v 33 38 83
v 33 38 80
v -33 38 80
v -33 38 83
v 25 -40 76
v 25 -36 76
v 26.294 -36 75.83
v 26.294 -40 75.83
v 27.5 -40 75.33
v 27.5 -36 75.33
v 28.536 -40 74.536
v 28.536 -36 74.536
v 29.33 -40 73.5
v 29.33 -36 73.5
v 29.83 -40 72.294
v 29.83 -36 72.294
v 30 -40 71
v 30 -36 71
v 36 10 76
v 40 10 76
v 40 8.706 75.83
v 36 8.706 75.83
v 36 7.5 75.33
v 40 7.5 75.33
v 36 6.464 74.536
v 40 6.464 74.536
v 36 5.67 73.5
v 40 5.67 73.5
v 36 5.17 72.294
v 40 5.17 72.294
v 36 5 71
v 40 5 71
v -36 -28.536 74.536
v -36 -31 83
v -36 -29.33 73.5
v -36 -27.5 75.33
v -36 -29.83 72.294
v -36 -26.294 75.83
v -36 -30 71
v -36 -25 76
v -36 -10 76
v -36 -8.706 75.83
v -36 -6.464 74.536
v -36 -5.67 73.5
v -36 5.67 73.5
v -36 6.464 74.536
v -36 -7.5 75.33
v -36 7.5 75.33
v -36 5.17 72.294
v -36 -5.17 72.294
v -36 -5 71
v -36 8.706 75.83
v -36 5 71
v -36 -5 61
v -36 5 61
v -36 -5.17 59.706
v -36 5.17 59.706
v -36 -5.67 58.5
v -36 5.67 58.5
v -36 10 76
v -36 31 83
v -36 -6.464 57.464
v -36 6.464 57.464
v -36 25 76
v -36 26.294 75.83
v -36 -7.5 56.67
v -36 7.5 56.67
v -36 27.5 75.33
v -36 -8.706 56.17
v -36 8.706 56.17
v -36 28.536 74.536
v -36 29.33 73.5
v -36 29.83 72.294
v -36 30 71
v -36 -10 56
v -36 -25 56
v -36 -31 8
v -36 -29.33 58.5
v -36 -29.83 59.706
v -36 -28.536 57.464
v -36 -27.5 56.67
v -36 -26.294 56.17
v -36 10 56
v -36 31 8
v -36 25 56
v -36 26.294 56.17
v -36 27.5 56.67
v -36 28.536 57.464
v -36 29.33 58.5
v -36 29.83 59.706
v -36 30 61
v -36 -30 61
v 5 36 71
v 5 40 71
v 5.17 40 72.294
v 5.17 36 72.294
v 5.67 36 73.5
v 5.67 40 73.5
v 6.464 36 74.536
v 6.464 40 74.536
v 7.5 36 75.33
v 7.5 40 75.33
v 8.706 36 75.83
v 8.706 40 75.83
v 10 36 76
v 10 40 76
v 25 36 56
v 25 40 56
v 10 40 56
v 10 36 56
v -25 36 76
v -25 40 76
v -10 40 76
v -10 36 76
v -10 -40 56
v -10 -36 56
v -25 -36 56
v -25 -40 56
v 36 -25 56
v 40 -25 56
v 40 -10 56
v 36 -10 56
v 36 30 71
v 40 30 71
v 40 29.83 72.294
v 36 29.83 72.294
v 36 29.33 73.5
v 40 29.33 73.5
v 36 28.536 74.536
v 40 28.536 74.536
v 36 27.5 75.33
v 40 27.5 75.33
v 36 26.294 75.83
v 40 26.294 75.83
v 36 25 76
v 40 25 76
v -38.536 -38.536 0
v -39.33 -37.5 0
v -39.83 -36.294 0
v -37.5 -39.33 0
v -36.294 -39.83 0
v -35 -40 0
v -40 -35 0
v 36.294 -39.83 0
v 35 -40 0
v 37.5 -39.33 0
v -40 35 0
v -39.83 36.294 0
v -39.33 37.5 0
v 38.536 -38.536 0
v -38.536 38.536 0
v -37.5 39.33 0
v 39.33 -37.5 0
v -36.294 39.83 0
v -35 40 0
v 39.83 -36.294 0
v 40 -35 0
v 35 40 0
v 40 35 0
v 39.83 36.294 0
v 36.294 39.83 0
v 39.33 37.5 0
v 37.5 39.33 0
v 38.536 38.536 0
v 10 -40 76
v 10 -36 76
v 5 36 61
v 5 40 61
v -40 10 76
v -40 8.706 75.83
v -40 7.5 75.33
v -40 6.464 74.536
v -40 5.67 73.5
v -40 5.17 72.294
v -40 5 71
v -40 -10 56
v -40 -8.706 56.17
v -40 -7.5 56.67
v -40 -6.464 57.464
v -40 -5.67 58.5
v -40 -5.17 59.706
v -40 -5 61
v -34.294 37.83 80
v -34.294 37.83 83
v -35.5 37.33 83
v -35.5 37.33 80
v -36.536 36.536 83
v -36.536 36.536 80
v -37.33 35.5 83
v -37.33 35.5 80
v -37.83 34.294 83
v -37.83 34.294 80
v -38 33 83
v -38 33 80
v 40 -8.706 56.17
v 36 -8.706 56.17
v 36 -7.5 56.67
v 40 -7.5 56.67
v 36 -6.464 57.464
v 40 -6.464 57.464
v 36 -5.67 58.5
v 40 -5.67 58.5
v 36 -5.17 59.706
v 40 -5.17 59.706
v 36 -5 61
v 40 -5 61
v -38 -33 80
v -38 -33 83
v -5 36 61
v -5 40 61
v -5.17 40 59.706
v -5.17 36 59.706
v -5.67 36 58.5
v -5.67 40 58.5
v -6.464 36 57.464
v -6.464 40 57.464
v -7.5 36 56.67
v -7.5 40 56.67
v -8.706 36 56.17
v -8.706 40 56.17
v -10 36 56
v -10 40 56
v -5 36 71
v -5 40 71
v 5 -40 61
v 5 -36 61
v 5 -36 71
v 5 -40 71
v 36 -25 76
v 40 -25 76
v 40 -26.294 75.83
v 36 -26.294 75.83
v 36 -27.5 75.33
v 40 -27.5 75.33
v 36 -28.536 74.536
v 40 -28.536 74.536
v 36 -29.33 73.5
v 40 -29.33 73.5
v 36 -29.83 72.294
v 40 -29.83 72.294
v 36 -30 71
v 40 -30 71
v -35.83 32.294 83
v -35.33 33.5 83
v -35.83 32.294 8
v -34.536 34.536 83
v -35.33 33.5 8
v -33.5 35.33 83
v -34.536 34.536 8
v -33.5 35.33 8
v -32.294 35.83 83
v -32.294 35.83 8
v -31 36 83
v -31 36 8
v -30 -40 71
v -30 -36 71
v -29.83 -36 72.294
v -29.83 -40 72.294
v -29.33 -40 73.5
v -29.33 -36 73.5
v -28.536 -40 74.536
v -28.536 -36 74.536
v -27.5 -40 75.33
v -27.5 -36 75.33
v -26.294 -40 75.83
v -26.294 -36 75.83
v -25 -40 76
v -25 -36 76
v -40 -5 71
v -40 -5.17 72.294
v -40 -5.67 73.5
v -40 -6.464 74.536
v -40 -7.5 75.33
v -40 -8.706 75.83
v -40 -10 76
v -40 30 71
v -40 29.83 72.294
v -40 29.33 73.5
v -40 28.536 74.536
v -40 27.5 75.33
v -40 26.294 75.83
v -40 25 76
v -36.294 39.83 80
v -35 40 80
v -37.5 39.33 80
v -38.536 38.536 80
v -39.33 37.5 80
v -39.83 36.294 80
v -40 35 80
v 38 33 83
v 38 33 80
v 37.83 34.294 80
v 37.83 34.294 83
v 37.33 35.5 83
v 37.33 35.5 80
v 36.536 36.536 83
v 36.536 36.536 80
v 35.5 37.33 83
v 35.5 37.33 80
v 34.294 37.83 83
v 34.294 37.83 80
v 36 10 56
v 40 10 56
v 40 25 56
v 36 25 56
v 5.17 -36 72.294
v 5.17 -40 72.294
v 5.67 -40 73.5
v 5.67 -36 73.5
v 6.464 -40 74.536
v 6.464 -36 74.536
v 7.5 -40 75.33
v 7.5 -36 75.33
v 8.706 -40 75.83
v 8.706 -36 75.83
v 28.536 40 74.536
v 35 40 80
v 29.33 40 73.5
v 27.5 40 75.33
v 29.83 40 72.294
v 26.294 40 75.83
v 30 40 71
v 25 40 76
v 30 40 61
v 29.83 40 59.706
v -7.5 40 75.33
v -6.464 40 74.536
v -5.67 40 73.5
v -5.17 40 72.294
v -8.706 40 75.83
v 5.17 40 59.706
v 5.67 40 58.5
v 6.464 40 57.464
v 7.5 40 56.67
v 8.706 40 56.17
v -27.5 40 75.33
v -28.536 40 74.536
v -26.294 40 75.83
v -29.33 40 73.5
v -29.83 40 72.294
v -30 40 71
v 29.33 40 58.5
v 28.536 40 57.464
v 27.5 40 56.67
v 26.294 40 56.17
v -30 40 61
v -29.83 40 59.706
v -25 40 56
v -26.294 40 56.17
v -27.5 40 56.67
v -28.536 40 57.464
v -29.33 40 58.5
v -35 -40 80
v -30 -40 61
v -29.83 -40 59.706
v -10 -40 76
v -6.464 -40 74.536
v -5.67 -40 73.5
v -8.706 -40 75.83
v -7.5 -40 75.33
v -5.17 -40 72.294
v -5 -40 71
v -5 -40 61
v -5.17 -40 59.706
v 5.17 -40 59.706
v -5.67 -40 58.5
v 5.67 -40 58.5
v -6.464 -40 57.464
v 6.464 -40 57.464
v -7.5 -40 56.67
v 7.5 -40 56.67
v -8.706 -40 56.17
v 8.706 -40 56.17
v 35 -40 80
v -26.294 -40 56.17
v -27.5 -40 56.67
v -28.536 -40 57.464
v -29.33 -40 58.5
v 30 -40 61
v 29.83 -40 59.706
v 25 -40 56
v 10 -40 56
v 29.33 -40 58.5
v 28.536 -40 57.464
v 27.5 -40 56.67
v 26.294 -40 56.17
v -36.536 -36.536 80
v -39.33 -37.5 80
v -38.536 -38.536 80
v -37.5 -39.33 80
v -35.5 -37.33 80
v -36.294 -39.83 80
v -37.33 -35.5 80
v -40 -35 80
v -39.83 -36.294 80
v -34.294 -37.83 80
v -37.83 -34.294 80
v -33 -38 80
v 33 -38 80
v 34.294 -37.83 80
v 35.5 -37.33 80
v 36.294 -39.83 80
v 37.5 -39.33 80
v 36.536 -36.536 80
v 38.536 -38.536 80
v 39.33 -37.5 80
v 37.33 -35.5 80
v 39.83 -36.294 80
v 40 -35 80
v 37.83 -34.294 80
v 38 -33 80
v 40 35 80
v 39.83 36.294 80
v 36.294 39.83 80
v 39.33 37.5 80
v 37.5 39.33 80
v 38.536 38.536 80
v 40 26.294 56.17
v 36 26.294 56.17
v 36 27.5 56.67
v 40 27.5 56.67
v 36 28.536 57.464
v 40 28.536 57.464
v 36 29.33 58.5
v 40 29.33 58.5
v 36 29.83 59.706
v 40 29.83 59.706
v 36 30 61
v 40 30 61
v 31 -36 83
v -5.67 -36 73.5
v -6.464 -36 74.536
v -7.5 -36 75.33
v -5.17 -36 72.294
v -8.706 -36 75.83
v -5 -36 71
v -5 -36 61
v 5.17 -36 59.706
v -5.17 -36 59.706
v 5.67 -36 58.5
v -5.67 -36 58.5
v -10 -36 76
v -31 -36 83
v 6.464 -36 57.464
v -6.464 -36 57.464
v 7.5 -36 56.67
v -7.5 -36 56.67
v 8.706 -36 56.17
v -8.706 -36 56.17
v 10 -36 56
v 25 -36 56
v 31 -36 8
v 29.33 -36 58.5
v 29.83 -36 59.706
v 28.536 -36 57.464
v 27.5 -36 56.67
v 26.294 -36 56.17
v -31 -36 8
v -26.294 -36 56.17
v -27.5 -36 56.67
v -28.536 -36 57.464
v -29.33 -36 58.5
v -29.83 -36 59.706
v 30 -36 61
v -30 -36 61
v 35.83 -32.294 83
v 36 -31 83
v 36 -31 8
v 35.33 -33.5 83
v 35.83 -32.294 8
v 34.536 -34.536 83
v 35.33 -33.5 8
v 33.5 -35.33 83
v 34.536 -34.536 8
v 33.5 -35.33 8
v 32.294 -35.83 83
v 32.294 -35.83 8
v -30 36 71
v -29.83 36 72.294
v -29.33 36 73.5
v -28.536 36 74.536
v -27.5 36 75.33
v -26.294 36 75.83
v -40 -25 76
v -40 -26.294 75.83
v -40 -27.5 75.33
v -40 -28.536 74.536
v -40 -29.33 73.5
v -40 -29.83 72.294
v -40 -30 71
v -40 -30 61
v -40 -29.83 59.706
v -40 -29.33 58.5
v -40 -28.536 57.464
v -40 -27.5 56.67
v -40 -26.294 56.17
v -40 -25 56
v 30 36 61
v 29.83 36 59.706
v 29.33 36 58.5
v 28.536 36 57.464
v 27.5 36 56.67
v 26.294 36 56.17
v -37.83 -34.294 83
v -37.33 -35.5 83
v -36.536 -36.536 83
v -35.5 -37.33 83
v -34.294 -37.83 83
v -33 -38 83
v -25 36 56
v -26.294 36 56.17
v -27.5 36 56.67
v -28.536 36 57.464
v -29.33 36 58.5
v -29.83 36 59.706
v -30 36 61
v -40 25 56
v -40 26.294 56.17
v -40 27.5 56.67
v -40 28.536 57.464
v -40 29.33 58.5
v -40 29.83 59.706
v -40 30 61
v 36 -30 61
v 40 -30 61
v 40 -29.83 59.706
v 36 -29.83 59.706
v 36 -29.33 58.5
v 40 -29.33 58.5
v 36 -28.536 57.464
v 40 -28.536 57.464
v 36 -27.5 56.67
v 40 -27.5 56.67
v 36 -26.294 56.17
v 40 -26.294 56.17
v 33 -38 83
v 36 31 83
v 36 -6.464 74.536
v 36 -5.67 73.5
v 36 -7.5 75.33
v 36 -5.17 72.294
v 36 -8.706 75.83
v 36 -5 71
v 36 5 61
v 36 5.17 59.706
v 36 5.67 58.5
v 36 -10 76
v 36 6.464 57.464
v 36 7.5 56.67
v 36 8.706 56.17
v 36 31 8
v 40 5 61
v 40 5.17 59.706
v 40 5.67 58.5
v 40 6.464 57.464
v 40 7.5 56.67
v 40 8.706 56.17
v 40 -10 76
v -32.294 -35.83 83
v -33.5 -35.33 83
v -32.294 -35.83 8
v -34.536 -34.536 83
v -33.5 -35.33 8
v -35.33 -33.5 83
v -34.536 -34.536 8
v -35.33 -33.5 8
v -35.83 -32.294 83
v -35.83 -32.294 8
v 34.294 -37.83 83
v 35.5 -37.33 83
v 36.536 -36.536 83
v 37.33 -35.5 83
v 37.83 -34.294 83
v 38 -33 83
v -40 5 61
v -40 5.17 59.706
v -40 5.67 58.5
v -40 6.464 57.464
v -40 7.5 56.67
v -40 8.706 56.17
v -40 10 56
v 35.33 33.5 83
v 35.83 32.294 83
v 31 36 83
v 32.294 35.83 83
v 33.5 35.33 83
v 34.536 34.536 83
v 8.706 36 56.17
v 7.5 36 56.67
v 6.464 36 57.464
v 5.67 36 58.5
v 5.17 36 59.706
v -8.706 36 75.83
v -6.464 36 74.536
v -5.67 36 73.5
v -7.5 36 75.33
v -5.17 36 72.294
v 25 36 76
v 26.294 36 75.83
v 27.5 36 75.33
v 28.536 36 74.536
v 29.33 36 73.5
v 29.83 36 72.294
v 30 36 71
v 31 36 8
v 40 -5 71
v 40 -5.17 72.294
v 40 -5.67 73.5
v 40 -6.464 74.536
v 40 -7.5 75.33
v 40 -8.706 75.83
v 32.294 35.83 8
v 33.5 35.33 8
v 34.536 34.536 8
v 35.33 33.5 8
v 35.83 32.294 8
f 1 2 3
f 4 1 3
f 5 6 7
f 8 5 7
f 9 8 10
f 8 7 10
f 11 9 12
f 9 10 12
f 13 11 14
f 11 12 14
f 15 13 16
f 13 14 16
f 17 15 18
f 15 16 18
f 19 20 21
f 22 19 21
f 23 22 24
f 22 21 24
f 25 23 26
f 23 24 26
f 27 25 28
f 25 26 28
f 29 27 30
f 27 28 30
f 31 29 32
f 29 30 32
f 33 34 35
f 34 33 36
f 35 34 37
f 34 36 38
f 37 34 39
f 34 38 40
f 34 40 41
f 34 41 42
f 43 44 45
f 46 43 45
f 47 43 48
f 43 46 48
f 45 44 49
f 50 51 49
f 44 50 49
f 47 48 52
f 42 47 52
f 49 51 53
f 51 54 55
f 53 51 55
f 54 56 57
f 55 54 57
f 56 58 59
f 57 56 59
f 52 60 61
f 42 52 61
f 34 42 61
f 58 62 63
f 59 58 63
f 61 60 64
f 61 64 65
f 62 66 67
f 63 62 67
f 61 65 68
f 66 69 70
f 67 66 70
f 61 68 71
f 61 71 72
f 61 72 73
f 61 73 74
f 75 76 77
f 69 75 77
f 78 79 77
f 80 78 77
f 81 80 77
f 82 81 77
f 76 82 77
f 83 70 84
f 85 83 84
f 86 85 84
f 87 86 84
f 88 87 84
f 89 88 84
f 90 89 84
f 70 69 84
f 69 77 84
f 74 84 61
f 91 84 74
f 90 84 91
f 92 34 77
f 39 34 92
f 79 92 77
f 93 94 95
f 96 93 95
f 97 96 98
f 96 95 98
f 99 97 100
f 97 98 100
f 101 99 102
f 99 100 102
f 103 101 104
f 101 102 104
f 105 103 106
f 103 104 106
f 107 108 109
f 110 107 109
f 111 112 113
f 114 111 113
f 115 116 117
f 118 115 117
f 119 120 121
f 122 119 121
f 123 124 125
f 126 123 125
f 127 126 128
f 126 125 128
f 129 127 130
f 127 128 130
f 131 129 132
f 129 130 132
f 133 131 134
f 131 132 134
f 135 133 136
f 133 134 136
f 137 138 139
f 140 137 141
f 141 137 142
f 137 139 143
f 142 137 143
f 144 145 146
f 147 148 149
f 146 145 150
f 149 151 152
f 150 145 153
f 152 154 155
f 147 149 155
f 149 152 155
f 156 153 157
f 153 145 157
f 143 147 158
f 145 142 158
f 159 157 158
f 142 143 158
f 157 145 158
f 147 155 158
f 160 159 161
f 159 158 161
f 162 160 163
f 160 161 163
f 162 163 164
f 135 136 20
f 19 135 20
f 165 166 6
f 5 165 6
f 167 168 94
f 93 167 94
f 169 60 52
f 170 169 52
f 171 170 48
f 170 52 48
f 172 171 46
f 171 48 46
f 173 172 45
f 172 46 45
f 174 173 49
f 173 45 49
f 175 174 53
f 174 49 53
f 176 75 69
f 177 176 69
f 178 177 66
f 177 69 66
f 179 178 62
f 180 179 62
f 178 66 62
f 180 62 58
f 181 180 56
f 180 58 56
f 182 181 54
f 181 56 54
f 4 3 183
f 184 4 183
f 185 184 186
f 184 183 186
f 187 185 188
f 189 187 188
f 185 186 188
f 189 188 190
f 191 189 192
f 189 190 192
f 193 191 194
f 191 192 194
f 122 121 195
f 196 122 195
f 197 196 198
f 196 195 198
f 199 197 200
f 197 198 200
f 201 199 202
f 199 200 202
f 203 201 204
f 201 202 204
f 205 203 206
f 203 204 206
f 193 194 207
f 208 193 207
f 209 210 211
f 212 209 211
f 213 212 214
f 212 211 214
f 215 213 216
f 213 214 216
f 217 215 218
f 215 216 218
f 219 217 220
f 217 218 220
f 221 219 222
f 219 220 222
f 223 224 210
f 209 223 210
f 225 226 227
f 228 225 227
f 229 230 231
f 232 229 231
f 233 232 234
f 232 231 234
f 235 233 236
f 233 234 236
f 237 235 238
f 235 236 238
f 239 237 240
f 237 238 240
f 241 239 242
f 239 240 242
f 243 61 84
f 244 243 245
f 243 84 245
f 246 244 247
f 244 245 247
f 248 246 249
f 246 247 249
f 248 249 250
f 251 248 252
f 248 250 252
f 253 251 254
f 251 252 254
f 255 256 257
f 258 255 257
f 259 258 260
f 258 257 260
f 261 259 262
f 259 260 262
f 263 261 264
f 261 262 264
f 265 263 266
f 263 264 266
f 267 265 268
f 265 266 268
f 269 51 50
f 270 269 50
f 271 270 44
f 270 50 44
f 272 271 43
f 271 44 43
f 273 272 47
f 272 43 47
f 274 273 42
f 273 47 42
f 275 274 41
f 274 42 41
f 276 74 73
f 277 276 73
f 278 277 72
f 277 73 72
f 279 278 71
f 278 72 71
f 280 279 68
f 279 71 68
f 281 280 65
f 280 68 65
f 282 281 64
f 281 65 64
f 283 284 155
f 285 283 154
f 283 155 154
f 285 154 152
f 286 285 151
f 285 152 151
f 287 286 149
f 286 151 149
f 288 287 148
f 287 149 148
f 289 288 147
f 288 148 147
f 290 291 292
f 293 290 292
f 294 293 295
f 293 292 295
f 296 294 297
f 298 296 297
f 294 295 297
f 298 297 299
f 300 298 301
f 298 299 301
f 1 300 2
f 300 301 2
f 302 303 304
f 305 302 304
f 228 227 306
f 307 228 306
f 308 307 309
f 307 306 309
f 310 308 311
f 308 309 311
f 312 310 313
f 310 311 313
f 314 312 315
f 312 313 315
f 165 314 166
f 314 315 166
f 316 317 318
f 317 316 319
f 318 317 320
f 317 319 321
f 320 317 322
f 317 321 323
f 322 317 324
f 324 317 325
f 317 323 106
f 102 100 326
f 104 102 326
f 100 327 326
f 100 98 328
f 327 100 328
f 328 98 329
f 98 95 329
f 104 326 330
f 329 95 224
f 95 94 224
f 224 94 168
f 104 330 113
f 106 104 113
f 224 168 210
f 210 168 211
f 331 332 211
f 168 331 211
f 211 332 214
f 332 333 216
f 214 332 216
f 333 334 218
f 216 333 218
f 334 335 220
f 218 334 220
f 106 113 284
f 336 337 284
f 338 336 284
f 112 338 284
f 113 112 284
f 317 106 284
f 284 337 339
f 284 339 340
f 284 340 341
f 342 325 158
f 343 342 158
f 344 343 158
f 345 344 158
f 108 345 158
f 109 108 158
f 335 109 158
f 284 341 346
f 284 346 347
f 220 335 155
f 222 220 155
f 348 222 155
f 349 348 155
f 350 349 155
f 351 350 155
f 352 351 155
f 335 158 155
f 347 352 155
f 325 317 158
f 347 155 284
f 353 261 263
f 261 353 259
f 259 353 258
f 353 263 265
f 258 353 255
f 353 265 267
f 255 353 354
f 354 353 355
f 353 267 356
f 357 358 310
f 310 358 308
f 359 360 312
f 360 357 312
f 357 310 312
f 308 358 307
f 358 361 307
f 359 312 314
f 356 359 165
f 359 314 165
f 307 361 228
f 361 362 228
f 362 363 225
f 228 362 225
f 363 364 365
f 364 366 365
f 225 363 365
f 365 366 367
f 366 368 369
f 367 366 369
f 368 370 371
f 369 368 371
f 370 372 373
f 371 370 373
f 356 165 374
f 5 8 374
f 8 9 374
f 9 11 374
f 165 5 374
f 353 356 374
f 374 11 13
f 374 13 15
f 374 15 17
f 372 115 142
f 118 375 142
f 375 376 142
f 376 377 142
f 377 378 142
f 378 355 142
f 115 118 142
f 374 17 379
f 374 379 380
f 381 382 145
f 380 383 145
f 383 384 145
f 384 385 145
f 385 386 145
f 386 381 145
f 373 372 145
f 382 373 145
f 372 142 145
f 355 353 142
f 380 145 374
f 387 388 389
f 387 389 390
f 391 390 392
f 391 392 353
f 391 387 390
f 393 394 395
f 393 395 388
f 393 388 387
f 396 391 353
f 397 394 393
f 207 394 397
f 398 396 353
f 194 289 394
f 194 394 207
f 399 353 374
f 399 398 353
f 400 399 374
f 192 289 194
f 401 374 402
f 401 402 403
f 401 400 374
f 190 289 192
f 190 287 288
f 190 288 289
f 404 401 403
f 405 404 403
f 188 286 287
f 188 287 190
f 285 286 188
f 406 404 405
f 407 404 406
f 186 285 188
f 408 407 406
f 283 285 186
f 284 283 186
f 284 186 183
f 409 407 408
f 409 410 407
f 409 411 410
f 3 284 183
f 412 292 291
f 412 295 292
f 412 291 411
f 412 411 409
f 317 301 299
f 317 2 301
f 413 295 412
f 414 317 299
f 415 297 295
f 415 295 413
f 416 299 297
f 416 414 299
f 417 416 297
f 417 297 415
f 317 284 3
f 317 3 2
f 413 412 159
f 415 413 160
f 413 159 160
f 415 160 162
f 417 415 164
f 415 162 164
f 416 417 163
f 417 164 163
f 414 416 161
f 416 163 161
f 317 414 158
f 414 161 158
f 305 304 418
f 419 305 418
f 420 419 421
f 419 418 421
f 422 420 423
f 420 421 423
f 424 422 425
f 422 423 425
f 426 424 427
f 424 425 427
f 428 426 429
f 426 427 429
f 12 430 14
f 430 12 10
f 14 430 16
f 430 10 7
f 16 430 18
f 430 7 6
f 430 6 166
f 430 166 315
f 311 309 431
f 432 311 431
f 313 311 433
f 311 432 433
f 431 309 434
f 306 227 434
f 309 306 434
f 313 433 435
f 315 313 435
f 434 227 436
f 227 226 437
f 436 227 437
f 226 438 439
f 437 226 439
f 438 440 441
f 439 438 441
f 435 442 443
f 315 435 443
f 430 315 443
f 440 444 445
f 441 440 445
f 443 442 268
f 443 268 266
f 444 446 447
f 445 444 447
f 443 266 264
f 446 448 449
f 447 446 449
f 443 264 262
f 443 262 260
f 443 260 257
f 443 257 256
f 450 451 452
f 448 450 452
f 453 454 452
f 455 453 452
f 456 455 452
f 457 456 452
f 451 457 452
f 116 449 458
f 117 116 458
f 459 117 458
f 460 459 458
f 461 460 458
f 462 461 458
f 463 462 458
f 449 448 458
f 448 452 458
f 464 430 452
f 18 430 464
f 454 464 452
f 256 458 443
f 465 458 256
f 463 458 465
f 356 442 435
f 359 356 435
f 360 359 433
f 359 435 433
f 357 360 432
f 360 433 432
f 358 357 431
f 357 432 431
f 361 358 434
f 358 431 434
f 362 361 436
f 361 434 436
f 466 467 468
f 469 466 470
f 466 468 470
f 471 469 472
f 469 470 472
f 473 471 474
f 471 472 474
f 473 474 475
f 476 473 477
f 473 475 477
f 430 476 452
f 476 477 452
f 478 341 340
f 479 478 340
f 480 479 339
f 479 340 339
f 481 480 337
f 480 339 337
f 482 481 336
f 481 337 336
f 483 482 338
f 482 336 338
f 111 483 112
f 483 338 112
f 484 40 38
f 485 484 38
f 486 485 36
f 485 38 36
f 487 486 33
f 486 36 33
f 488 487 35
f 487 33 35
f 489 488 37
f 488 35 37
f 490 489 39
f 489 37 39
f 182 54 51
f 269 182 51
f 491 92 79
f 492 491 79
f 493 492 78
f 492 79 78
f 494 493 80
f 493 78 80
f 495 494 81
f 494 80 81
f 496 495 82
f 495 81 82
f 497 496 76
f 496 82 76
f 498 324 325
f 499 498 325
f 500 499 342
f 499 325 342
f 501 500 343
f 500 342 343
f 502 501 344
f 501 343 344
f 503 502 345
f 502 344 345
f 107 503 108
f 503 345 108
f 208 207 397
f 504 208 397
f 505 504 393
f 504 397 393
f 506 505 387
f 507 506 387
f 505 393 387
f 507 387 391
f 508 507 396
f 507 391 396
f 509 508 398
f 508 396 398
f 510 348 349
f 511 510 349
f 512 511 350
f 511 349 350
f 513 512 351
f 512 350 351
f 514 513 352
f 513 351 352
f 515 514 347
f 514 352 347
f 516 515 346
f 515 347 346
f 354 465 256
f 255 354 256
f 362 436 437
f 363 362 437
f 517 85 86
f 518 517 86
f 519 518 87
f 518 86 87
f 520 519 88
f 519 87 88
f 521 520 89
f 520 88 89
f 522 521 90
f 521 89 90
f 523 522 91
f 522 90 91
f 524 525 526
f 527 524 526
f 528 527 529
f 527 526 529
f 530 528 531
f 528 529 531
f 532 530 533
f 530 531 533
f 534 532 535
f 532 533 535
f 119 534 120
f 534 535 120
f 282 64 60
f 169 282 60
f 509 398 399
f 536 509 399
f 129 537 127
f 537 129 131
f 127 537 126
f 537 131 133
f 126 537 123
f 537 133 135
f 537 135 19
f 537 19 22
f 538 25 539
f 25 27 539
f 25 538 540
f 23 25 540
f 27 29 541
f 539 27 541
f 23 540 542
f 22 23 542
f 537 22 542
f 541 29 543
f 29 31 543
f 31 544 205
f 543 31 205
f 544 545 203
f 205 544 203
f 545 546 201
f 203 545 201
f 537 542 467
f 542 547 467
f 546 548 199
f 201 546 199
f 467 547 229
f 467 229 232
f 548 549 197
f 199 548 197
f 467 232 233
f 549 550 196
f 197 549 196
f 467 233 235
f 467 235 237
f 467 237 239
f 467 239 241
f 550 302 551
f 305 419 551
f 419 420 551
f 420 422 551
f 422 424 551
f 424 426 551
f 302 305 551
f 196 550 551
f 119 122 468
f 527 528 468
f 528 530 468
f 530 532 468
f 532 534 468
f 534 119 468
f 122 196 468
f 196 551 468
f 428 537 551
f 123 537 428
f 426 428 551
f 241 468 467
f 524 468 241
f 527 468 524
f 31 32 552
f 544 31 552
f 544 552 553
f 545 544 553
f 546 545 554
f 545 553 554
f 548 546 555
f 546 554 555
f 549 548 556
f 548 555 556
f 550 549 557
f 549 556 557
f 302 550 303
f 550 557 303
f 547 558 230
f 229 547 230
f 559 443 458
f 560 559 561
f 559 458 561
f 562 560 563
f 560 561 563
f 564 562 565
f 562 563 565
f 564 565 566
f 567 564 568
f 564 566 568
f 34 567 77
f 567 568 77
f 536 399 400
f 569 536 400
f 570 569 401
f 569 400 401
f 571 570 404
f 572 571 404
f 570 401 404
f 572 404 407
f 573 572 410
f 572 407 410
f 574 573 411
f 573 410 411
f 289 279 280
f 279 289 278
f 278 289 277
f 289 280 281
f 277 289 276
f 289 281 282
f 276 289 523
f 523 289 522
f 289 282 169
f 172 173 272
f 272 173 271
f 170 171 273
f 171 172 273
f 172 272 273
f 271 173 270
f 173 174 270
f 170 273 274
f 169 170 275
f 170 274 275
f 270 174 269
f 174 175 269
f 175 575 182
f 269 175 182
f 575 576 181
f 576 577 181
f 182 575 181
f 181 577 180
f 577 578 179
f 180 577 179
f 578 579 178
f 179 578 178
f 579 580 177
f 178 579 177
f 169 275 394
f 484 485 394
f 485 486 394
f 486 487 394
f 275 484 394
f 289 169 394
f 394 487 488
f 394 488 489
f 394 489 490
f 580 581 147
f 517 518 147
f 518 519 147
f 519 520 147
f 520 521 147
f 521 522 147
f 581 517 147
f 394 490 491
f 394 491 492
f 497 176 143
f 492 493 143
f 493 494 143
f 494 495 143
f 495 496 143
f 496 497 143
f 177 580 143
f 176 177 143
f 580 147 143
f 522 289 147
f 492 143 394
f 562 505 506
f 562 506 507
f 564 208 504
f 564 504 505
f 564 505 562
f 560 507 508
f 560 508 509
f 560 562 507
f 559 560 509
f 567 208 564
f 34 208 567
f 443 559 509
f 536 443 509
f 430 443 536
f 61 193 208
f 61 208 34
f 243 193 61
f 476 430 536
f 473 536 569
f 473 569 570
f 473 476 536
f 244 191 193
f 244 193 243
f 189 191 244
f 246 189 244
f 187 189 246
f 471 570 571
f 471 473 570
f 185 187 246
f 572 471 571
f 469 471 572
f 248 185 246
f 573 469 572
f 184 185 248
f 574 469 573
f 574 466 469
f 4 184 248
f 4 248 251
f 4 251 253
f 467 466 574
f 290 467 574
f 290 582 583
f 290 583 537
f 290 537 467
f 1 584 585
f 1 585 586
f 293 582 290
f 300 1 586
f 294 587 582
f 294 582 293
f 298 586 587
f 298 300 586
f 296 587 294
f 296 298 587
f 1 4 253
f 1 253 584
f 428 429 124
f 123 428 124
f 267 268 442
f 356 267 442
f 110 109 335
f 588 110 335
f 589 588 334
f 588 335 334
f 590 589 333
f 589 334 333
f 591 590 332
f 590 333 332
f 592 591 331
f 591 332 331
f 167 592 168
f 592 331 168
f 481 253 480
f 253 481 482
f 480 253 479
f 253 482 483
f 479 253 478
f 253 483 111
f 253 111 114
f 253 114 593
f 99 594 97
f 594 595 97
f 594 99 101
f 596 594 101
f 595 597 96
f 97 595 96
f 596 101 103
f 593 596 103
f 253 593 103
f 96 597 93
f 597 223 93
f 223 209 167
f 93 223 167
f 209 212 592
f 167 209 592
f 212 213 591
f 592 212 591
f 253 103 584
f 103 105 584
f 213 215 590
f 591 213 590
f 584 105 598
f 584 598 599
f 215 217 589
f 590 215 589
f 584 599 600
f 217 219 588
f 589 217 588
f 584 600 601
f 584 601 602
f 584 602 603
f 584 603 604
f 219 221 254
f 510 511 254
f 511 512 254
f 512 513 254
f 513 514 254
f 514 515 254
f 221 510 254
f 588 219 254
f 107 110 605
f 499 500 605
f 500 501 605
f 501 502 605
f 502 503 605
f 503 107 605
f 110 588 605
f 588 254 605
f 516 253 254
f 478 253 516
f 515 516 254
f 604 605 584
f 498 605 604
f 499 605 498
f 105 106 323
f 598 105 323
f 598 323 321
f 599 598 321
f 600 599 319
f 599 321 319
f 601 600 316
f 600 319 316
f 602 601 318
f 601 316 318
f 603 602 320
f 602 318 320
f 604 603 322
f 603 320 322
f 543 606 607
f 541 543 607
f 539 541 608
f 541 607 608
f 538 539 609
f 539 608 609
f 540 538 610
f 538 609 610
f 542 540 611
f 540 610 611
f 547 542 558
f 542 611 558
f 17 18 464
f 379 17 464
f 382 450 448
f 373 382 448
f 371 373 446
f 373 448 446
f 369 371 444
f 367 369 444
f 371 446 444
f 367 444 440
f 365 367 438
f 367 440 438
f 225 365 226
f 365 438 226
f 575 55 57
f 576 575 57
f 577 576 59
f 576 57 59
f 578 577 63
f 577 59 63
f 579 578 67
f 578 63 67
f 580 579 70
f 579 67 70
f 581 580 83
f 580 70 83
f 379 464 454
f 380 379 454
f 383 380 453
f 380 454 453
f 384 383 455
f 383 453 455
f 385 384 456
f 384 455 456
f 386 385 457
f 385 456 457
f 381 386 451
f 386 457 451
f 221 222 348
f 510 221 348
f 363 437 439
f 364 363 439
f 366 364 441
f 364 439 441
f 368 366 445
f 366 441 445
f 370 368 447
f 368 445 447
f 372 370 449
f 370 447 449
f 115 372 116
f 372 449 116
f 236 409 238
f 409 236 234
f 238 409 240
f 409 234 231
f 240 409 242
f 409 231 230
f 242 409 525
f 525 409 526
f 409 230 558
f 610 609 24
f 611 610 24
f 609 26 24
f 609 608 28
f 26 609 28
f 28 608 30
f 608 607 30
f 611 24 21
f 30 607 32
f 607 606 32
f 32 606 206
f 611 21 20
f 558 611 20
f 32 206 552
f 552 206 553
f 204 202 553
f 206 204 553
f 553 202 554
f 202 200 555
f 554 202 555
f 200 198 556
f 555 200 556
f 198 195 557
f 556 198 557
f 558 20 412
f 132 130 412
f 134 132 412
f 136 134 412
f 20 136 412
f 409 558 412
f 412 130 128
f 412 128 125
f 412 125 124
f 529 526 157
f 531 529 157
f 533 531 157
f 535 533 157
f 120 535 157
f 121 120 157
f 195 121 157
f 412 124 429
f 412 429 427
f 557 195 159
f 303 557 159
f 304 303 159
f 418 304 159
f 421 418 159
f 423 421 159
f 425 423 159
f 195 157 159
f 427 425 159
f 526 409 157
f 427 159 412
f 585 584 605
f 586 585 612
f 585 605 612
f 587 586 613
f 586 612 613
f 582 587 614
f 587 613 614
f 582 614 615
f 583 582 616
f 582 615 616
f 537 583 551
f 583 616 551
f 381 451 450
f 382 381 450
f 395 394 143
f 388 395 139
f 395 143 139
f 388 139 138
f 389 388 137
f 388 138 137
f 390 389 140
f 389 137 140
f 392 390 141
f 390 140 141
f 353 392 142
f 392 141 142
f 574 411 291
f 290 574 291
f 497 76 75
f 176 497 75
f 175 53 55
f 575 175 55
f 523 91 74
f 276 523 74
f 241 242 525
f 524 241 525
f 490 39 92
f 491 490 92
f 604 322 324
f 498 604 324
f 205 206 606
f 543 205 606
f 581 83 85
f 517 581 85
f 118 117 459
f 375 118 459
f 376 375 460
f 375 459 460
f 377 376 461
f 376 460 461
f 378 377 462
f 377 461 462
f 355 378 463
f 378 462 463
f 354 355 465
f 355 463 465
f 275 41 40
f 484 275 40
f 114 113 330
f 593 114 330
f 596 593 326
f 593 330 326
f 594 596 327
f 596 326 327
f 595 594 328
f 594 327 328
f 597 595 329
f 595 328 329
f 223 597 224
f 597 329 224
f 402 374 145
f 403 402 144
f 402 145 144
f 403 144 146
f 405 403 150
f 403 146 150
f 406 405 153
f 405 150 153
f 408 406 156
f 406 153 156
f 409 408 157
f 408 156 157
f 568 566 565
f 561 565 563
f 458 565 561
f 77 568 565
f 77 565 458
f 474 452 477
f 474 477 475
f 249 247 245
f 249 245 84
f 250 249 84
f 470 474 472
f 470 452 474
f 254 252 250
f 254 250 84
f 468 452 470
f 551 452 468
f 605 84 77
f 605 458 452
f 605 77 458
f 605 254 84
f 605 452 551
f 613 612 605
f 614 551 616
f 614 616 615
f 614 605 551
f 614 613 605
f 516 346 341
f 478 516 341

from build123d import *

# Parameters (mm, degrees)
F1_DEPTH = 80
F2_DEPTH = 8
F4_DEPTH = 3
F7_DEPTH = 80.001
F8_DEPTH = 80.001


with BuildPart() as f1:
    # F0 (on Top) → F1 (new body)
    with BuildSketch(Plane.XY):
        with BuildLine():
            Line((35, 40), (-35, 40))
            ThreePointArc((-35, 40), (-38.535534, 38.535534), (-40, 35))
            Line((-40, 35), (-40, -35))
            ThreePointArc((-40, -35), (-38.535534, -38.535534), (-35, -40))
            Line((-35, -40), (35, -40))
            ThreePointArc((35, -40), (38.535534, -38.535534), (40, -35))
            Line((40, -35), (40, 35))
            ThreePointArc((40, 35), (38.535534, 38.535534), (35, 40))
        make_face()
        with BuildLine():
            ThreePointArc((-36, 31), (-34.535534, 34.535534), (-31, 36))
            Line((-31, 36), (31, 36))
            ThreePointArc((31, 36), (34.535534, 34.535534), (36, 31))
            Line((36, 31), (36, -31))
            ThreePointArc((36, -31), (34.535534, -34.535534), (31, -36))
            Line((31, -36), (-31, -36))
            ThreePointArc((-31, -36), (-34.535534, -34.535534), (-36, -31))
            Line((-36, -31), (-36, 31))
        make_face(mode=Mode.SUBTRACT)
    extrude(amount=F1_DEPTH)

    # F0 (on Top) → F2 (join)
    with BuildSketch(Plane.XY):
        with BuildLine():
            Line((31, 36), (-31, 36))
            ThreePointArc((-31, 36), (-34.535534, 34.535534), (-36, 31))
            Line((-36, 31), (-36, -31))
            ThreePointArc((-36, -31), (-34.535534, -34.535534), (-31, -36))
            Line((-31, -36), (31, -36))
            ThreePointArc((31, -36), (34.535534, -34.535534), (36, -31))
            Line((36, -31), (36, 31))
            ThreePointArc((36, 31), (34.535534, 34.535534), (31, 36))
        make_face()
    extrude(amount=F2_DEPTH)

    # F3 (on face) → F4 (join)
    with BuildSketch(Plane.XY.offset(80)):
        with BuildLine():
            Line((33, 38), (-33, 38))
            ThreePointArc((-33, 38), (-36.535534, 36.535534), (-38, 33))
            Line((-38, 33), (-38, -33))
            ThreePointArc((-38, -33), (-36.535534, -36.535534), (-33, -38))
            Line((-33, -38), (33, -38))
            ThreePointArc((33, -38), (36.535534, -36.535534), (38, -33))
            Line((38, -33), (38, 33))
            ThreePointArc((38, 33), (36.535534, 36.535534), (33, 38))
        make_face()
        with BuildLine():
            Line((-36, -31), (-36, 31))
            ThreePointArc((-36, 31), (-34.535534, 34.535534), (-31, 36))
            Line((-31, 36), (31, 36))
            ThreePointArc((31, 36), (34.535534, 34.535534), (36, 31))
            Line((36, 31), (36, -31))
            ThreePointArc((36, -31), (34.535534, -34.535534), (31, -36))
            Line((31, -36), (-31, -36))
            ThreePointArc((-31, -36), (-34.535534, -34.535534), (-36, -31))
        make_face(mode=Mode.SUBTRACT)
    extrude(amount=F4_DEPTH)

    # F6 (on face) → F7 (cut, through all)
    with BuildSketch(Plane(origin=(0, 40, 0), x_dir=(-1, 0, 0), z_dir=(0, 1, 0))):
        with BuildLine():
            Line((-25, 56), (-10, 56))
            ThreePointArc((-10, 56), (-6.464466, 57.464466), (-5, 61))
            Line((-5, 61), (-5, 71))
            ThreePointArc((-5, 71), (-6.464466, 74.535534), (-10, 76))
            Line((-10, 76), (-25, 76))
            ThreePointArc((-25, 76), (-28.535534, 74.535534), (-30, 71))
            Line((-30, 71), (-30, 61))
            ThreePointArc((-30, 61), (-28.535534, 57.464466), (-25, 56))
        make_face()
        with BuildLine():
            ThreePointArc((5, 61), (6.464466, 57.464466), (10, 56))
            Line((10, 56), (25, 56))
            ThreePointArc((25, 56), (28.535534, 57.464466), (30, 61))
            Line((30, 61), (30, 71))
            ThreePointArc((30, 71), (28.535534, 74.535534), (25, 76))
            Line((25, 76), (10, 76))
            ThreePointArc((10, 76), (6.464466, 74.535534), (5, 71))
            Line((5, 71), (5, 61))
        make_face()
    extrude(amount=-F7_DEPTH, mode=Mode.SUBTRACT)

    # F5 (on face) → F8 (cut, through all)
    with BuildSketch(Plane.YZ.offset(40)):
        with BuildLine():
            Line((-25, 56), (-10, 56))
            ThreePointArc((-10, 56), (-6.464466, 57.464466), (-5, 61))
            Line((-5, 61), (-5, 71))
            ThreePointArc((-5, 71), (-6.464466, 74.535534), (-10, 76))
            Line((-10, 76), (-25, 76))
            ThreePointArc((-25, 76), (-28.535534, 74.535534), (-30, 71))
            Line((-30, 71), (-30, 61))
            ThreePointArc((-30, 61), (-28.535534, 57.464466), (-25, 56))
        make_face()
        with BuildLine():
            ThreePointArc((5, 61), (6.464466, 57.464466), (10, 56))
            Line((10, 56), (25, 56))
            ThreePointArc((25, 56), (28.535534, 57.464466), (30, 61))
            Line((30, 61), (30, 71))
            ThreePointArc((30, 71), (28.535534, 74.535534), (25, 76))
            Line((25, 76), (10, 76))
            ThreePointArc((10, 76), (6.464466, 74.535534), (5, 71))
            Line((5, 71), (5, 61))
        make_face()
    extrude(amount=-F8_DEPTH, mode=Mode.SUBTRACT)


solid = f1.part
